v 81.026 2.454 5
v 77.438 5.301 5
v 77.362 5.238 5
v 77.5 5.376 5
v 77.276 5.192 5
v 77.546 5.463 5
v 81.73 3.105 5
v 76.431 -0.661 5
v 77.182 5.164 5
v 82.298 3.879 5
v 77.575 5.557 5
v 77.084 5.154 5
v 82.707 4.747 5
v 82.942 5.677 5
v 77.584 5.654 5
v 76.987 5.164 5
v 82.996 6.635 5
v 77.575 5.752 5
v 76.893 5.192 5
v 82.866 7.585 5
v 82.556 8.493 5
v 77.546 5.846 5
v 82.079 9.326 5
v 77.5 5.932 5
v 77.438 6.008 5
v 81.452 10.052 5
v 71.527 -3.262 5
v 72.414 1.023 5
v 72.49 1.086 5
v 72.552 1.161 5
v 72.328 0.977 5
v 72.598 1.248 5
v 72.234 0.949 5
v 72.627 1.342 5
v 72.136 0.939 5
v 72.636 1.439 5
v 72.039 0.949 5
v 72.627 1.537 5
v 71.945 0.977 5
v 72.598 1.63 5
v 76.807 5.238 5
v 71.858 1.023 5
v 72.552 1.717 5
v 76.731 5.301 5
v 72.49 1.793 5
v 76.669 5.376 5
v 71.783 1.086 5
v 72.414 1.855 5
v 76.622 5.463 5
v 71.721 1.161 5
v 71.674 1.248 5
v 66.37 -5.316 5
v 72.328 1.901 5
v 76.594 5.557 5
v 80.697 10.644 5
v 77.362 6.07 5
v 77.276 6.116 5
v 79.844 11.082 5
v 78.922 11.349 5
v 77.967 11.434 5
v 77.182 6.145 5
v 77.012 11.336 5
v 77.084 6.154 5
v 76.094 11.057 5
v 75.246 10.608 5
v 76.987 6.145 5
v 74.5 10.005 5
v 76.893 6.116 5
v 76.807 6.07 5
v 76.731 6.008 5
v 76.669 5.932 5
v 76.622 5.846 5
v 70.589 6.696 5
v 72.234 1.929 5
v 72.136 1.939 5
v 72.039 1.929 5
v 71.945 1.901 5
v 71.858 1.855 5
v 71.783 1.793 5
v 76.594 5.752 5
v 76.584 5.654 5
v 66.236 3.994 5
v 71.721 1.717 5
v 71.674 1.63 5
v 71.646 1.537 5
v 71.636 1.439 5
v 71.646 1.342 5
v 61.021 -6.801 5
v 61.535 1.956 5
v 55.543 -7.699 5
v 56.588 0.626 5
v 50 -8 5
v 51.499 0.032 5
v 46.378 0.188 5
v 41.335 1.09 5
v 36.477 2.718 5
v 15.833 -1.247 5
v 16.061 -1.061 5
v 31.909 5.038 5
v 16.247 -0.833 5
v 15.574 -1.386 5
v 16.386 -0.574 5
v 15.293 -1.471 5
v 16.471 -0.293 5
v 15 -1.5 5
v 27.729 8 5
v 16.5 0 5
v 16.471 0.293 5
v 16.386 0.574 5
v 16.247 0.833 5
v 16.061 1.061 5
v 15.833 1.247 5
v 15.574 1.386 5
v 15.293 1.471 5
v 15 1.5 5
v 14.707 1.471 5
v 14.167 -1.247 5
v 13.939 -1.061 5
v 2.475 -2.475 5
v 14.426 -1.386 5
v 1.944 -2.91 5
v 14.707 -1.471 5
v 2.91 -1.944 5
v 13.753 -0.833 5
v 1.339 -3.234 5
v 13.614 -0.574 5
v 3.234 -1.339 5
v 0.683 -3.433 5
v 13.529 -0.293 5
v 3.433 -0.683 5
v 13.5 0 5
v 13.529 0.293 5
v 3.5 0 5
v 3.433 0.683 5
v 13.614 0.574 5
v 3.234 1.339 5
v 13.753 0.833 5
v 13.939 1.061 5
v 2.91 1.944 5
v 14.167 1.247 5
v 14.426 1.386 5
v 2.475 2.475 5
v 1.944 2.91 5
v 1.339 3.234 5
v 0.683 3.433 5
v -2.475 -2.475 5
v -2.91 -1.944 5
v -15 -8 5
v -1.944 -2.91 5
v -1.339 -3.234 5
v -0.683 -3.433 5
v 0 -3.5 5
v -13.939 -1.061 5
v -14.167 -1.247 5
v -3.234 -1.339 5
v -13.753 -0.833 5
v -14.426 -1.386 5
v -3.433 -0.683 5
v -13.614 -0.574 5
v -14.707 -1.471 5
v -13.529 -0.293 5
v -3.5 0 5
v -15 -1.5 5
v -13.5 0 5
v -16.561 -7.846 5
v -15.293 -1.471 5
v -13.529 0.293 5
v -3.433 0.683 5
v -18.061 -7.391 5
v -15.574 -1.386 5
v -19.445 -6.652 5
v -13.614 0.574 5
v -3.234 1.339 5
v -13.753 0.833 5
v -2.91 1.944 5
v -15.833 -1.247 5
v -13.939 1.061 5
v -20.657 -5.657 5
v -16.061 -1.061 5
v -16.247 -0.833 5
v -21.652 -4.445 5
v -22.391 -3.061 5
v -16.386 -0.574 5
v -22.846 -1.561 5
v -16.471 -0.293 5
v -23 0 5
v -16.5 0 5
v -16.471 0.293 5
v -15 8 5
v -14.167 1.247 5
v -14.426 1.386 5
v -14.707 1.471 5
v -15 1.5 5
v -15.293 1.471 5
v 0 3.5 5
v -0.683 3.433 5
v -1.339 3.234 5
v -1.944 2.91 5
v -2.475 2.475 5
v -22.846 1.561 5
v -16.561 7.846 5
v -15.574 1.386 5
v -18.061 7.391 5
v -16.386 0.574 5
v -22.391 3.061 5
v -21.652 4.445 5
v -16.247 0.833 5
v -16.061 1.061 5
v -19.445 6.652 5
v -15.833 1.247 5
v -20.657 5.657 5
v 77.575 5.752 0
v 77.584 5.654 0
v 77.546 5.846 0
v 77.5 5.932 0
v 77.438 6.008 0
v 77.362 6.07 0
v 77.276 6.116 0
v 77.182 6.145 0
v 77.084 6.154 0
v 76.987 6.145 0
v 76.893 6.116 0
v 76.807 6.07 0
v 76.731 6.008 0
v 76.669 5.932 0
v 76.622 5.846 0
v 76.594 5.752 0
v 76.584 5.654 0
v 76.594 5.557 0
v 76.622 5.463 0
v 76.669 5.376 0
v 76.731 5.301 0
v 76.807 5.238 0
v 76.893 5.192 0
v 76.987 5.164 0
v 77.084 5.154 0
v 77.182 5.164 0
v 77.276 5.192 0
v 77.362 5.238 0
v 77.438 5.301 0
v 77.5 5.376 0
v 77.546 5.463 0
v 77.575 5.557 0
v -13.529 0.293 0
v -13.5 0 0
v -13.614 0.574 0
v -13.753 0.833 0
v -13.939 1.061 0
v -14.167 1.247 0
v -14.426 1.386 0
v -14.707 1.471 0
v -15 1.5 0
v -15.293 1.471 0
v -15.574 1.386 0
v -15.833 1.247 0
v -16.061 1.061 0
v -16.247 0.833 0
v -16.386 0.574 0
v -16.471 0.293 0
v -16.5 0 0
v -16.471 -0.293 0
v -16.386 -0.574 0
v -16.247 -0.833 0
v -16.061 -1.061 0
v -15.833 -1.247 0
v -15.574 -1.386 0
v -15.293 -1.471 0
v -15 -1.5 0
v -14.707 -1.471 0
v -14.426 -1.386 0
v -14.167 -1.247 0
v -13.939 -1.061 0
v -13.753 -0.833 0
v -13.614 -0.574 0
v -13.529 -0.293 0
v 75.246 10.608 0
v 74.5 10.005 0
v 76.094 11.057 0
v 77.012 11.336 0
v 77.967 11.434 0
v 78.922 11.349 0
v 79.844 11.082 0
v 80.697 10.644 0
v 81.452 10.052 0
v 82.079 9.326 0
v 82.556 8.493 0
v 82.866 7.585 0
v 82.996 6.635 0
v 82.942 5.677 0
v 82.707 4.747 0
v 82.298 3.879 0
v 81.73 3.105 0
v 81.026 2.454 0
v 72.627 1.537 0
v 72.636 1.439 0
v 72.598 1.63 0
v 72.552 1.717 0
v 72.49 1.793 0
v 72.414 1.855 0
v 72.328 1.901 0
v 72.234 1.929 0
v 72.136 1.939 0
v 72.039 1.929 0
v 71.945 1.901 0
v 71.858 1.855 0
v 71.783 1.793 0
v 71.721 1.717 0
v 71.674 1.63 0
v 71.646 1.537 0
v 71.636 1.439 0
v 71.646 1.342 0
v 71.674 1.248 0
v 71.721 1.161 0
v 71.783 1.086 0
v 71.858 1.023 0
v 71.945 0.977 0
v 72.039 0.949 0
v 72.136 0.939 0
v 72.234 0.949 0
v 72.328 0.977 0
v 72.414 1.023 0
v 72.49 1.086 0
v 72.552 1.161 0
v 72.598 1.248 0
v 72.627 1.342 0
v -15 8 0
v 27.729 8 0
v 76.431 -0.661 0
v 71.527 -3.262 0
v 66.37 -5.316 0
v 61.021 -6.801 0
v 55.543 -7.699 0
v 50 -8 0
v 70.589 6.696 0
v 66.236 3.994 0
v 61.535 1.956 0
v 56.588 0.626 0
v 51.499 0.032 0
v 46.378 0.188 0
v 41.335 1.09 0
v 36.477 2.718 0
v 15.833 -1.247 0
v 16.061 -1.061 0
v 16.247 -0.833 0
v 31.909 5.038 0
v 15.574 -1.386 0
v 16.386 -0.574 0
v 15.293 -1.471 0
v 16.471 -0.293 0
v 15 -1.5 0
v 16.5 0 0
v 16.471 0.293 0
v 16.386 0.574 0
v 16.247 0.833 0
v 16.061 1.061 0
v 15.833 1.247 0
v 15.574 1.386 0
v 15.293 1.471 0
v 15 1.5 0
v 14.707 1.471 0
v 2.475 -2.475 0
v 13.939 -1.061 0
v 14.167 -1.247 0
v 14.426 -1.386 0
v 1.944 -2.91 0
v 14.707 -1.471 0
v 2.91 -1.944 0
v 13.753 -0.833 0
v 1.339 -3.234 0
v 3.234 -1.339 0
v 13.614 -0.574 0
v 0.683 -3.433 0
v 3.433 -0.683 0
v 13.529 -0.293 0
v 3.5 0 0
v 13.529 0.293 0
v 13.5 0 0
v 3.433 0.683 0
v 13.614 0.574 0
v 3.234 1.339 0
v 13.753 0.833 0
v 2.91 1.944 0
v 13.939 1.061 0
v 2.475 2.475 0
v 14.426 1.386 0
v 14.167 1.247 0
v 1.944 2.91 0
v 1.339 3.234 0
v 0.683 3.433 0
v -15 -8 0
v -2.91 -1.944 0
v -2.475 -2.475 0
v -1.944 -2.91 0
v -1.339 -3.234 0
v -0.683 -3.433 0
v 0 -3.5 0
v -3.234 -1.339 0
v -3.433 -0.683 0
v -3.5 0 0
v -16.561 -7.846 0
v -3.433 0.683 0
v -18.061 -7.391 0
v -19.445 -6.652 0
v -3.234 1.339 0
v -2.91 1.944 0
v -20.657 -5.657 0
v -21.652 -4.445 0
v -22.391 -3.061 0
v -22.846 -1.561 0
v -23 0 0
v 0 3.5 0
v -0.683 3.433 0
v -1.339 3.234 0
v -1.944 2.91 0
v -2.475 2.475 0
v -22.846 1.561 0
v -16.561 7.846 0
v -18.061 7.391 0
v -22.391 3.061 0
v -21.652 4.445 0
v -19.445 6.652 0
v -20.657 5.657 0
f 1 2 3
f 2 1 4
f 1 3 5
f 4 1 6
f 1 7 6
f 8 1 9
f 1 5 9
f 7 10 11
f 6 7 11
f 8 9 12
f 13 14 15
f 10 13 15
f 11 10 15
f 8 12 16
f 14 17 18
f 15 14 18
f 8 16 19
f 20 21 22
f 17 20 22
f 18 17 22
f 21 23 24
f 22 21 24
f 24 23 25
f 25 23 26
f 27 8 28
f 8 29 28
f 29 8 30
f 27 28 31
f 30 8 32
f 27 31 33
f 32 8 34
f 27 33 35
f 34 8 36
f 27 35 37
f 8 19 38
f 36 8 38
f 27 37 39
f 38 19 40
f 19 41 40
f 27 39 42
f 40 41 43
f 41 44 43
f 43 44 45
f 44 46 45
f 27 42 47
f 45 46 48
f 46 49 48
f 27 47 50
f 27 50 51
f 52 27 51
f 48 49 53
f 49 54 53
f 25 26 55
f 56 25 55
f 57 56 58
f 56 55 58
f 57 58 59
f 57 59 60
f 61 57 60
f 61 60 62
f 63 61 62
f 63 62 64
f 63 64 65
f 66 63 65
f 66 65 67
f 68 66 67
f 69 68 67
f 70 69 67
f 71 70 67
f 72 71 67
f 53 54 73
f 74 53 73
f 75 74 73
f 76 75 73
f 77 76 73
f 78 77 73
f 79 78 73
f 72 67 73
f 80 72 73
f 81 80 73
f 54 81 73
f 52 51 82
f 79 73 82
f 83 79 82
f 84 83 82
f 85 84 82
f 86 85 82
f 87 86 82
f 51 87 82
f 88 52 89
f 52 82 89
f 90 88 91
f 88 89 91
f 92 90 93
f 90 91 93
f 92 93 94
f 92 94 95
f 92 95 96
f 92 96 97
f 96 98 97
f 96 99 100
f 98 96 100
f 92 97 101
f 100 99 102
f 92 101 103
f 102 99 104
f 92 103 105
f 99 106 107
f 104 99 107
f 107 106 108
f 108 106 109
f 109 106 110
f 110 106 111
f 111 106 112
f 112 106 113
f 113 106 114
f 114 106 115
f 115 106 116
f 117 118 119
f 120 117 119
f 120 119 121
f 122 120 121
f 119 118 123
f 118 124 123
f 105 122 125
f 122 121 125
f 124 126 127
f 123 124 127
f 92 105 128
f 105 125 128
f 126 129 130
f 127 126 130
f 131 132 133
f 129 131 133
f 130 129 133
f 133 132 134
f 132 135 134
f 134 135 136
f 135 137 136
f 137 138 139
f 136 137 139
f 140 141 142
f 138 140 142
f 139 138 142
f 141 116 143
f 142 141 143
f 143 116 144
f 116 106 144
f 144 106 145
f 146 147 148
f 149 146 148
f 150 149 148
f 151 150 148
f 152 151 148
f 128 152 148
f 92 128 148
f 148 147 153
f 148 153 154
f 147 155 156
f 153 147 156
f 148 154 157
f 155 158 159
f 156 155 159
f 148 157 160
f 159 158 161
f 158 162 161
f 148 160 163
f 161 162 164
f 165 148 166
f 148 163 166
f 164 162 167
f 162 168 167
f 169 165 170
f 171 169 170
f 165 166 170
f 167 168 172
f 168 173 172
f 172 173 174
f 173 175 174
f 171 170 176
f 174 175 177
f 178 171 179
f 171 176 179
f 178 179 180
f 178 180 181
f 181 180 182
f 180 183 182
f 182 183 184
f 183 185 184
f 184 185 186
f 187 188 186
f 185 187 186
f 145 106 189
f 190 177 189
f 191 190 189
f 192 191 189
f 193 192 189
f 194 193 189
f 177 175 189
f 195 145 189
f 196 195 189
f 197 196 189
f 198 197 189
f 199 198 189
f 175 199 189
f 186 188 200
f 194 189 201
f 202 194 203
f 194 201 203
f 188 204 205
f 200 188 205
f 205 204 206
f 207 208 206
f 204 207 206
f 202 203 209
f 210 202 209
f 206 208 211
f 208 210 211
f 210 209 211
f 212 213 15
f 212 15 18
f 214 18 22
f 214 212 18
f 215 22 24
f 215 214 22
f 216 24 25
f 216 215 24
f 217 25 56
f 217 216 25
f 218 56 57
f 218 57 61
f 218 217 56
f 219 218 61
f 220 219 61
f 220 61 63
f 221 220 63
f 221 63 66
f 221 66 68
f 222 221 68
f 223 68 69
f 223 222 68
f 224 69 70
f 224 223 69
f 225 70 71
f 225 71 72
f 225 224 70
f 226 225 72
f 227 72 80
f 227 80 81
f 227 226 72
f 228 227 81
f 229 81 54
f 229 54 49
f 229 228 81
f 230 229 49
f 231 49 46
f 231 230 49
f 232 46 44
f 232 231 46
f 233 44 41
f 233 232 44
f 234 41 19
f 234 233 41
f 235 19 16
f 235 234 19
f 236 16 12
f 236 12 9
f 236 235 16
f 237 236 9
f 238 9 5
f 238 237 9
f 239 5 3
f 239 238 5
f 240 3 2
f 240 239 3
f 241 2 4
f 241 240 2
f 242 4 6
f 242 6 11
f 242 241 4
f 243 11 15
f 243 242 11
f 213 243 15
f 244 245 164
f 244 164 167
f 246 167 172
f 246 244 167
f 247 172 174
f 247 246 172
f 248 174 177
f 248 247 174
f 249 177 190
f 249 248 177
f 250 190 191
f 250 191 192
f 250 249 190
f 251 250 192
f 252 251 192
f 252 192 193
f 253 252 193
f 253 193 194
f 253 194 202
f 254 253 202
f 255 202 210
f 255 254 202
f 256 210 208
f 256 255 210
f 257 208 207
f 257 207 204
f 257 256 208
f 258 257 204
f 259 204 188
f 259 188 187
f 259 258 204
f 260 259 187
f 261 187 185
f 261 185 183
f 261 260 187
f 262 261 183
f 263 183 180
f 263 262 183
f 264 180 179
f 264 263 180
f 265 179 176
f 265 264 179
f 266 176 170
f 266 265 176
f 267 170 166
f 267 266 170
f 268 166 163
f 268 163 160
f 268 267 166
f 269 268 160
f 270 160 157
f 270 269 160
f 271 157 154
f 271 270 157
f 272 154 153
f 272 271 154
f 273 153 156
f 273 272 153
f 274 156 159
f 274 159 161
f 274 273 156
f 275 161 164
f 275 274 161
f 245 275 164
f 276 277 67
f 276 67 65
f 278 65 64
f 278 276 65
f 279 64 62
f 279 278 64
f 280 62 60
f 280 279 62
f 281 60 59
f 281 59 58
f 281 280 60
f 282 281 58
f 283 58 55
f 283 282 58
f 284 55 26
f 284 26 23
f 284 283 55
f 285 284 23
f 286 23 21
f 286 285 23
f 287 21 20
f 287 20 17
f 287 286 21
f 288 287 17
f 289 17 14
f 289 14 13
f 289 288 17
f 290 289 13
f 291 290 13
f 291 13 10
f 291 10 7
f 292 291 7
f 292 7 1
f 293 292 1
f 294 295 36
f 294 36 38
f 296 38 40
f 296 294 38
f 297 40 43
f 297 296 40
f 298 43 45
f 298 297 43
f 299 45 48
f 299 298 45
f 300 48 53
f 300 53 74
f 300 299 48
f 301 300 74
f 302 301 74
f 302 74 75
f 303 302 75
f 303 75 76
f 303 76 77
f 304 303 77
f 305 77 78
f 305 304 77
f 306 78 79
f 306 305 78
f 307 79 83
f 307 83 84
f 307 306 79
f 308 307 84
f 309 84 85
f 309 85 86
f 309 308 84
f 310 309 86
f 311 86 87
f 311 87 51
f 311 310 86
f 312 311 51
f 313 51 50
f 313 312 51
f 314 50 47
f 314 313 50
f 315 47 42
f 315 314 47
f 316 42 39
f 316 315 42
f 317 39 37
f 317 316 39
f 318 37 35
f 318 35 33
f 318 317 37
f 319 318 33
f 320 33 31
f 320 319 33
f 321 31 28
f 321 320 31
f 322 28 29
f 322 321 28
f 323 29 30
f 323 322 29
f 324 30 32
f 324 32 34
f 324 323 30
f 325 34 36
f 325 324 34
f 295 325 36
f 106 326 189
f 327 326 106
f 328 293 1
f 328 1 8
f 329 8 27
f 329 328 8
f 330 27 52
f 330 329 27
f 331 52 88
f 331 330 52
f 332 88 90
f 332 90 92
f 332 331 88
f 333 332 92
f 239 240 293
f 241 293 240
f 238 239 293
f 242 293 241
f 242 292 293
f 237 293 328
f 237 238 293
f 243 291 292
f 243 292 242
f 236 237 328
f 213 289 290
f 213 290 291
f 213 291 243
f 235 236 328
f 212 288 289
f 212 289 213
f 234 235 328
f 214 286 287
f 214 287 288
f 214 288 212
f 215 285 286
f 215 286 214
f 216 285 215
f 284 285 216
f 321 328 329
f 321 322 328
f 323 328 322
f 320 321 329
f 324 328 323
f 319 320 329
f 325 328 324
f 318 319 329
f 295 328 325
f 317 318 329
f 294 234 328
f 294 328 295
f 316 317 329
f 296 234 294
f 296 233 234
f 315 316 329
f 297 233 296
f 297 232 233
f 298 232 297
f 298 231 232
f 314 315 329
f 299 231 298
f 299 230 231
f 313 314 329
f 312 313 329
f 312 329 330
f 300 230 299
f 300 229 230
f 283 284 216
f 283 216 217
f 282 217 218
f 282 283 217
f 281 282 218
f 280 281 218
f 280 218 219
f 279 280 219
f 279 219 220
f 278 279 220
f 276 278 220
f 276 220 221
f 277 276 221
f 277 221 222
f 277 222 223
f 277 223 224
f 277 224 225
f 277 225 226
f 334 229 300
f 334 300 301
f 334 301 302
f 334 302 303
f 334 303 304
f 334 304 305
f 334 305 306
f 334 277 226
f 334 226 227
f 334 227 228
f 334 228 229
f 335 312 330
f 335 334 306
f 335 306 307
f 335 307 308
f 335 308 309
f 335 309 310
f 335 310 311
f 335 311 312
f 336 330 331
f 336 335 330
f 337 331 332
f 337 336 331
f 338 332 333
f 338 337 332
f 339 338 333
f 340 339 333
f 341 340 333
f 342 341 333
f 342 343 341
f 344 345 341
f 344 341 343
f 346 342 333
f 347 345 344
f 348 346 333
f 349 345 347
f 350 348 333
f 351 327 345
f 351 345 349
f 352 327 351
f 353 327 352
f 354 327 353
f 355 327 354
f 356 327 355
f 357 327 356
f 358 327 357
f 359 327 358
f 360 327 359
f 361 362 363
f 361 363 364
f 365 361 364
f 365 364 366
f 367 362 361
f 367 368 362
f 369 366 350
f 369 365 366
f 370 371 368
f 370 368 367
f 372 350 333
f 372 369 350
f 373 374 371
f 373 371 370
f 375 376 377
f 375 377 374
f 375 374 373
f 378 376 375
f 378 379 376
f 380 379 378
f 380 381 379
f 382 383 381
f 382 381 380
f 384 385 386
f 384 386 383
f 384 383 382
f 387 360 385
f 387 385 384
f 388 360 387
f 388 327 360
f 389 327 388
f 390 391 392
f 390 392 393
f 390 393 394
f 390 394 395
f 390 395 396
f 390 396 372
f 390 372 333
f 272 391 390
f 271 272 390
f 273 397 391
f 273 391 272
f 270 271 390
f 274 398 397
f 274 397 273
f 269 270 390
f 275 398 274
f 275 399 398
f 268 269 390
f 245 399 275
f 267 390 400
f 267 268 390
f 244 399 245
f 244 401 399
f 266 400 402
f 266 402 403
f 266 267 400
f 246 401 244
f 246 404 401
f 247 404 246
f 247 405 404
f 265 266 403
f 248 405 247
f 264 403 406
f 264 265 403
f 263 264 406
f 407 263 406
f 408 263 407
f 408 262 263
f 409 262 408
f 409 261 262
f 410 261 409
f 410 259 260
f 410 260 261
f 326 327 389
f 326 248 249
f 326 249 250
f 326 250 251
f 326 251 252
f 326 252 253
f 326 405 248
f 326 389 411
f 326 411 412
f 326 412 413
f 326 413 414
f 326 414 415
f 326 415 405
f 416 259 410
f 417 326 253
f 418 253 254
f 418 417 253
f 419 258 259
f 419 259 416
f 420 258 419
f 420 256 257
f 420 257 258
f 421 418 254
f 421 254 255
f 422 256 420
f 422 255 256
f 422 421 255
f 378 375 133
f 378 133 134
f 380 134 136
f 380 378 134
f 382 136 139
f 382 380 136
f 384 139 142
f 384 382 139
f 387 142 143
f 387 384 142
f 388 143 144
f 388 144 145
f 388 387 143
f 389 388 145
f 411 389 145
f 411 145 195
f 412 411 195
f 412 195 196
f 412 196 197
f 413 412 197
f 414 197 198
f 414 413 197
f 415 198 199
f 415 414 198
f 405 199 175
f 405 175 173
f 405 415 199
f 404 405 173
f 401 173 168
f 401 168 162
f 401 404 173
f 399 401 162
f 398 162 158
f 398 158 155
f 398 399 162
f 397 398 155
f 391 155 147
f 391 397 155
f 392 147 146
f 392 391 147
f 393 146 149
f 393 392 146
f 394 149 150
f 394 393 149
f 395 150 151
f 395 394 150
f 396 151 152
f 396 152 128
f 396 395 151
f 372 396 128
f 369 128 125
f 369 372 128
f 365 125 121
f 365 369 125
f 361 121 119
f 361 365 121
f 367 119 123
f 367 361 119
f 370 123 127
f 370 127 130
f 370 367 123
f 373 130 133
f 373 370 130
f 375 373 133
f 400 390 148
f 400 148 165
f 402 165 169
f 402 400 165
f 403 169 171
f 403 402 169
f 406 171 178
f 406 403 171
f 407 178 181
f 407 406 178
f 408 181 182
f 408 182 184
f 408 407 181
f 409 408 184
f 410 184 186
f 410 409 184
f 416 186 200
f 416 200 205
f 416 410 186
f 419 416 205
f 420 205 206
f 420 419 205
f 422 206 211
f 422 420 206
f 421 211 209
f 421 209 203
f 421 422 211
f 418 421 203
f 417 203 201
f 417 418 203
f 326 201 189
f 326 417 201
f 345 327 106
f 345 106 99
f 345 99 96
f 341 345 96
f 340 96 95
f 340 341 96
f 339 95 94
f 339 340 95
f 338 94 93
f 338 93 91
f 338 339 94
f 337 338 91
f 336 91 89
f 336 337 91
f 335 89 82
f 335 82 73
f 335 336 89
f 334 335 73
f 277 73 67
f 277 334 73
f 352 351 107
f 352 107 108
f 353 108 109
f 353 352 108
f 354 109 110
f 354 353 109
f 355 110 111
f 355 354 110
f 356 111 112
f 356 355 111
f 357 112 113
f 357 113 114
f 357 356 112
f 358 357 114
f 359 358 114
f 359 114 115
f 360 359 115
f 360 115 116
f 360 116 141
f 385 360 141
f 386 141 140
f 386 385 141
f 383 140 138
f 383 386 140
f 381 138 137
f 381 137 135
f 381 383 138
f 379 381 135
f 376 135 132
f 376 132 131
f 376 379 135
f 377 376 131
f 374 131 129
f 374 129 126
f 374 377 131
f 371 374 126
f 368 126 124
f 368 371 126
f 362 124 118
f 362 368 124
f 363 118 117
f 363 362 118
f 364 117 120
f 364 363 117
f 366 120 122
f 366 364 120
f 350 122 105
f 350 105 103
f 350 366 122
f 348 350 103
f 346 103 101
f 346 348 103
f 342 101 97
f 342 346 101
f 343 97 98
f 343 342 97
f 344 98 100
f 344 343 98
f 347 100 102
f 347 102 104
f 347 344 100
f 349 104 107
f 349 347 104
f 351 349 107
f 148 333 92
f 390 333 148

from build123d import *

# Parameters (mm, degrees)
ESQUISSE1_R        = 0.5
ESQUISSE1_R_2      = 1.5
ESQUISSE1_R_3      = 3.5
BOSS_EXTRU_1_DEPTH = 5


with BuildPart() as part:
    # Esquisse1 → Boss.-Extru.1 (new body)
    with BuildSketch(Plane.XY):
        with BuildLine():
            Line((0, 8), (20, 8))
            Line((20, 8), (27.728942549, 8))
            ThreePointArc((27.728942549, 8), (51.499017336, 0.032115491), (74.5, 10.0050005))
            ThreePointArc((74.5, 10.0050005), (81.783026213, 9.703645958), (81.02586797, 2.453818596))
            ThreePointArc((81.02586797, 2.453818596), (66.369841222, -5.316304031), (50, -8))
            Line((50, -8), (0, -8))
            Line((0, -8), (-15, -8))
            ThreePointArc((-15, -8), (-23, 0), (-15, 8))
            Line((-15, 8), (0, 8))
        make_face()
        with Locations((77.084290067, 5.654211565)):
            Circle(ESQUISSE1_R, mode=Mode.SUBTRACT)
        with Locations((15, 0)):
            Circle(ESQUISSE1_R_2, mode=Mode.SUBTRACT)
        with Locations((-15, 0)):
            Circle(ESQUISSE1_R_2, mode=Mode.SUBTRACT)
        Circle(ESQUISSE1_R_3, mode=Mode.SUBTRACT)
        with Locations((72.136277137, 1.439099698)):
            Circle(ESQUISSE1_R, mode=Mode.SUBTRACT)
    extrude(amount=BOSS_EXTRU_1_DEPTH)


solid = part.part
